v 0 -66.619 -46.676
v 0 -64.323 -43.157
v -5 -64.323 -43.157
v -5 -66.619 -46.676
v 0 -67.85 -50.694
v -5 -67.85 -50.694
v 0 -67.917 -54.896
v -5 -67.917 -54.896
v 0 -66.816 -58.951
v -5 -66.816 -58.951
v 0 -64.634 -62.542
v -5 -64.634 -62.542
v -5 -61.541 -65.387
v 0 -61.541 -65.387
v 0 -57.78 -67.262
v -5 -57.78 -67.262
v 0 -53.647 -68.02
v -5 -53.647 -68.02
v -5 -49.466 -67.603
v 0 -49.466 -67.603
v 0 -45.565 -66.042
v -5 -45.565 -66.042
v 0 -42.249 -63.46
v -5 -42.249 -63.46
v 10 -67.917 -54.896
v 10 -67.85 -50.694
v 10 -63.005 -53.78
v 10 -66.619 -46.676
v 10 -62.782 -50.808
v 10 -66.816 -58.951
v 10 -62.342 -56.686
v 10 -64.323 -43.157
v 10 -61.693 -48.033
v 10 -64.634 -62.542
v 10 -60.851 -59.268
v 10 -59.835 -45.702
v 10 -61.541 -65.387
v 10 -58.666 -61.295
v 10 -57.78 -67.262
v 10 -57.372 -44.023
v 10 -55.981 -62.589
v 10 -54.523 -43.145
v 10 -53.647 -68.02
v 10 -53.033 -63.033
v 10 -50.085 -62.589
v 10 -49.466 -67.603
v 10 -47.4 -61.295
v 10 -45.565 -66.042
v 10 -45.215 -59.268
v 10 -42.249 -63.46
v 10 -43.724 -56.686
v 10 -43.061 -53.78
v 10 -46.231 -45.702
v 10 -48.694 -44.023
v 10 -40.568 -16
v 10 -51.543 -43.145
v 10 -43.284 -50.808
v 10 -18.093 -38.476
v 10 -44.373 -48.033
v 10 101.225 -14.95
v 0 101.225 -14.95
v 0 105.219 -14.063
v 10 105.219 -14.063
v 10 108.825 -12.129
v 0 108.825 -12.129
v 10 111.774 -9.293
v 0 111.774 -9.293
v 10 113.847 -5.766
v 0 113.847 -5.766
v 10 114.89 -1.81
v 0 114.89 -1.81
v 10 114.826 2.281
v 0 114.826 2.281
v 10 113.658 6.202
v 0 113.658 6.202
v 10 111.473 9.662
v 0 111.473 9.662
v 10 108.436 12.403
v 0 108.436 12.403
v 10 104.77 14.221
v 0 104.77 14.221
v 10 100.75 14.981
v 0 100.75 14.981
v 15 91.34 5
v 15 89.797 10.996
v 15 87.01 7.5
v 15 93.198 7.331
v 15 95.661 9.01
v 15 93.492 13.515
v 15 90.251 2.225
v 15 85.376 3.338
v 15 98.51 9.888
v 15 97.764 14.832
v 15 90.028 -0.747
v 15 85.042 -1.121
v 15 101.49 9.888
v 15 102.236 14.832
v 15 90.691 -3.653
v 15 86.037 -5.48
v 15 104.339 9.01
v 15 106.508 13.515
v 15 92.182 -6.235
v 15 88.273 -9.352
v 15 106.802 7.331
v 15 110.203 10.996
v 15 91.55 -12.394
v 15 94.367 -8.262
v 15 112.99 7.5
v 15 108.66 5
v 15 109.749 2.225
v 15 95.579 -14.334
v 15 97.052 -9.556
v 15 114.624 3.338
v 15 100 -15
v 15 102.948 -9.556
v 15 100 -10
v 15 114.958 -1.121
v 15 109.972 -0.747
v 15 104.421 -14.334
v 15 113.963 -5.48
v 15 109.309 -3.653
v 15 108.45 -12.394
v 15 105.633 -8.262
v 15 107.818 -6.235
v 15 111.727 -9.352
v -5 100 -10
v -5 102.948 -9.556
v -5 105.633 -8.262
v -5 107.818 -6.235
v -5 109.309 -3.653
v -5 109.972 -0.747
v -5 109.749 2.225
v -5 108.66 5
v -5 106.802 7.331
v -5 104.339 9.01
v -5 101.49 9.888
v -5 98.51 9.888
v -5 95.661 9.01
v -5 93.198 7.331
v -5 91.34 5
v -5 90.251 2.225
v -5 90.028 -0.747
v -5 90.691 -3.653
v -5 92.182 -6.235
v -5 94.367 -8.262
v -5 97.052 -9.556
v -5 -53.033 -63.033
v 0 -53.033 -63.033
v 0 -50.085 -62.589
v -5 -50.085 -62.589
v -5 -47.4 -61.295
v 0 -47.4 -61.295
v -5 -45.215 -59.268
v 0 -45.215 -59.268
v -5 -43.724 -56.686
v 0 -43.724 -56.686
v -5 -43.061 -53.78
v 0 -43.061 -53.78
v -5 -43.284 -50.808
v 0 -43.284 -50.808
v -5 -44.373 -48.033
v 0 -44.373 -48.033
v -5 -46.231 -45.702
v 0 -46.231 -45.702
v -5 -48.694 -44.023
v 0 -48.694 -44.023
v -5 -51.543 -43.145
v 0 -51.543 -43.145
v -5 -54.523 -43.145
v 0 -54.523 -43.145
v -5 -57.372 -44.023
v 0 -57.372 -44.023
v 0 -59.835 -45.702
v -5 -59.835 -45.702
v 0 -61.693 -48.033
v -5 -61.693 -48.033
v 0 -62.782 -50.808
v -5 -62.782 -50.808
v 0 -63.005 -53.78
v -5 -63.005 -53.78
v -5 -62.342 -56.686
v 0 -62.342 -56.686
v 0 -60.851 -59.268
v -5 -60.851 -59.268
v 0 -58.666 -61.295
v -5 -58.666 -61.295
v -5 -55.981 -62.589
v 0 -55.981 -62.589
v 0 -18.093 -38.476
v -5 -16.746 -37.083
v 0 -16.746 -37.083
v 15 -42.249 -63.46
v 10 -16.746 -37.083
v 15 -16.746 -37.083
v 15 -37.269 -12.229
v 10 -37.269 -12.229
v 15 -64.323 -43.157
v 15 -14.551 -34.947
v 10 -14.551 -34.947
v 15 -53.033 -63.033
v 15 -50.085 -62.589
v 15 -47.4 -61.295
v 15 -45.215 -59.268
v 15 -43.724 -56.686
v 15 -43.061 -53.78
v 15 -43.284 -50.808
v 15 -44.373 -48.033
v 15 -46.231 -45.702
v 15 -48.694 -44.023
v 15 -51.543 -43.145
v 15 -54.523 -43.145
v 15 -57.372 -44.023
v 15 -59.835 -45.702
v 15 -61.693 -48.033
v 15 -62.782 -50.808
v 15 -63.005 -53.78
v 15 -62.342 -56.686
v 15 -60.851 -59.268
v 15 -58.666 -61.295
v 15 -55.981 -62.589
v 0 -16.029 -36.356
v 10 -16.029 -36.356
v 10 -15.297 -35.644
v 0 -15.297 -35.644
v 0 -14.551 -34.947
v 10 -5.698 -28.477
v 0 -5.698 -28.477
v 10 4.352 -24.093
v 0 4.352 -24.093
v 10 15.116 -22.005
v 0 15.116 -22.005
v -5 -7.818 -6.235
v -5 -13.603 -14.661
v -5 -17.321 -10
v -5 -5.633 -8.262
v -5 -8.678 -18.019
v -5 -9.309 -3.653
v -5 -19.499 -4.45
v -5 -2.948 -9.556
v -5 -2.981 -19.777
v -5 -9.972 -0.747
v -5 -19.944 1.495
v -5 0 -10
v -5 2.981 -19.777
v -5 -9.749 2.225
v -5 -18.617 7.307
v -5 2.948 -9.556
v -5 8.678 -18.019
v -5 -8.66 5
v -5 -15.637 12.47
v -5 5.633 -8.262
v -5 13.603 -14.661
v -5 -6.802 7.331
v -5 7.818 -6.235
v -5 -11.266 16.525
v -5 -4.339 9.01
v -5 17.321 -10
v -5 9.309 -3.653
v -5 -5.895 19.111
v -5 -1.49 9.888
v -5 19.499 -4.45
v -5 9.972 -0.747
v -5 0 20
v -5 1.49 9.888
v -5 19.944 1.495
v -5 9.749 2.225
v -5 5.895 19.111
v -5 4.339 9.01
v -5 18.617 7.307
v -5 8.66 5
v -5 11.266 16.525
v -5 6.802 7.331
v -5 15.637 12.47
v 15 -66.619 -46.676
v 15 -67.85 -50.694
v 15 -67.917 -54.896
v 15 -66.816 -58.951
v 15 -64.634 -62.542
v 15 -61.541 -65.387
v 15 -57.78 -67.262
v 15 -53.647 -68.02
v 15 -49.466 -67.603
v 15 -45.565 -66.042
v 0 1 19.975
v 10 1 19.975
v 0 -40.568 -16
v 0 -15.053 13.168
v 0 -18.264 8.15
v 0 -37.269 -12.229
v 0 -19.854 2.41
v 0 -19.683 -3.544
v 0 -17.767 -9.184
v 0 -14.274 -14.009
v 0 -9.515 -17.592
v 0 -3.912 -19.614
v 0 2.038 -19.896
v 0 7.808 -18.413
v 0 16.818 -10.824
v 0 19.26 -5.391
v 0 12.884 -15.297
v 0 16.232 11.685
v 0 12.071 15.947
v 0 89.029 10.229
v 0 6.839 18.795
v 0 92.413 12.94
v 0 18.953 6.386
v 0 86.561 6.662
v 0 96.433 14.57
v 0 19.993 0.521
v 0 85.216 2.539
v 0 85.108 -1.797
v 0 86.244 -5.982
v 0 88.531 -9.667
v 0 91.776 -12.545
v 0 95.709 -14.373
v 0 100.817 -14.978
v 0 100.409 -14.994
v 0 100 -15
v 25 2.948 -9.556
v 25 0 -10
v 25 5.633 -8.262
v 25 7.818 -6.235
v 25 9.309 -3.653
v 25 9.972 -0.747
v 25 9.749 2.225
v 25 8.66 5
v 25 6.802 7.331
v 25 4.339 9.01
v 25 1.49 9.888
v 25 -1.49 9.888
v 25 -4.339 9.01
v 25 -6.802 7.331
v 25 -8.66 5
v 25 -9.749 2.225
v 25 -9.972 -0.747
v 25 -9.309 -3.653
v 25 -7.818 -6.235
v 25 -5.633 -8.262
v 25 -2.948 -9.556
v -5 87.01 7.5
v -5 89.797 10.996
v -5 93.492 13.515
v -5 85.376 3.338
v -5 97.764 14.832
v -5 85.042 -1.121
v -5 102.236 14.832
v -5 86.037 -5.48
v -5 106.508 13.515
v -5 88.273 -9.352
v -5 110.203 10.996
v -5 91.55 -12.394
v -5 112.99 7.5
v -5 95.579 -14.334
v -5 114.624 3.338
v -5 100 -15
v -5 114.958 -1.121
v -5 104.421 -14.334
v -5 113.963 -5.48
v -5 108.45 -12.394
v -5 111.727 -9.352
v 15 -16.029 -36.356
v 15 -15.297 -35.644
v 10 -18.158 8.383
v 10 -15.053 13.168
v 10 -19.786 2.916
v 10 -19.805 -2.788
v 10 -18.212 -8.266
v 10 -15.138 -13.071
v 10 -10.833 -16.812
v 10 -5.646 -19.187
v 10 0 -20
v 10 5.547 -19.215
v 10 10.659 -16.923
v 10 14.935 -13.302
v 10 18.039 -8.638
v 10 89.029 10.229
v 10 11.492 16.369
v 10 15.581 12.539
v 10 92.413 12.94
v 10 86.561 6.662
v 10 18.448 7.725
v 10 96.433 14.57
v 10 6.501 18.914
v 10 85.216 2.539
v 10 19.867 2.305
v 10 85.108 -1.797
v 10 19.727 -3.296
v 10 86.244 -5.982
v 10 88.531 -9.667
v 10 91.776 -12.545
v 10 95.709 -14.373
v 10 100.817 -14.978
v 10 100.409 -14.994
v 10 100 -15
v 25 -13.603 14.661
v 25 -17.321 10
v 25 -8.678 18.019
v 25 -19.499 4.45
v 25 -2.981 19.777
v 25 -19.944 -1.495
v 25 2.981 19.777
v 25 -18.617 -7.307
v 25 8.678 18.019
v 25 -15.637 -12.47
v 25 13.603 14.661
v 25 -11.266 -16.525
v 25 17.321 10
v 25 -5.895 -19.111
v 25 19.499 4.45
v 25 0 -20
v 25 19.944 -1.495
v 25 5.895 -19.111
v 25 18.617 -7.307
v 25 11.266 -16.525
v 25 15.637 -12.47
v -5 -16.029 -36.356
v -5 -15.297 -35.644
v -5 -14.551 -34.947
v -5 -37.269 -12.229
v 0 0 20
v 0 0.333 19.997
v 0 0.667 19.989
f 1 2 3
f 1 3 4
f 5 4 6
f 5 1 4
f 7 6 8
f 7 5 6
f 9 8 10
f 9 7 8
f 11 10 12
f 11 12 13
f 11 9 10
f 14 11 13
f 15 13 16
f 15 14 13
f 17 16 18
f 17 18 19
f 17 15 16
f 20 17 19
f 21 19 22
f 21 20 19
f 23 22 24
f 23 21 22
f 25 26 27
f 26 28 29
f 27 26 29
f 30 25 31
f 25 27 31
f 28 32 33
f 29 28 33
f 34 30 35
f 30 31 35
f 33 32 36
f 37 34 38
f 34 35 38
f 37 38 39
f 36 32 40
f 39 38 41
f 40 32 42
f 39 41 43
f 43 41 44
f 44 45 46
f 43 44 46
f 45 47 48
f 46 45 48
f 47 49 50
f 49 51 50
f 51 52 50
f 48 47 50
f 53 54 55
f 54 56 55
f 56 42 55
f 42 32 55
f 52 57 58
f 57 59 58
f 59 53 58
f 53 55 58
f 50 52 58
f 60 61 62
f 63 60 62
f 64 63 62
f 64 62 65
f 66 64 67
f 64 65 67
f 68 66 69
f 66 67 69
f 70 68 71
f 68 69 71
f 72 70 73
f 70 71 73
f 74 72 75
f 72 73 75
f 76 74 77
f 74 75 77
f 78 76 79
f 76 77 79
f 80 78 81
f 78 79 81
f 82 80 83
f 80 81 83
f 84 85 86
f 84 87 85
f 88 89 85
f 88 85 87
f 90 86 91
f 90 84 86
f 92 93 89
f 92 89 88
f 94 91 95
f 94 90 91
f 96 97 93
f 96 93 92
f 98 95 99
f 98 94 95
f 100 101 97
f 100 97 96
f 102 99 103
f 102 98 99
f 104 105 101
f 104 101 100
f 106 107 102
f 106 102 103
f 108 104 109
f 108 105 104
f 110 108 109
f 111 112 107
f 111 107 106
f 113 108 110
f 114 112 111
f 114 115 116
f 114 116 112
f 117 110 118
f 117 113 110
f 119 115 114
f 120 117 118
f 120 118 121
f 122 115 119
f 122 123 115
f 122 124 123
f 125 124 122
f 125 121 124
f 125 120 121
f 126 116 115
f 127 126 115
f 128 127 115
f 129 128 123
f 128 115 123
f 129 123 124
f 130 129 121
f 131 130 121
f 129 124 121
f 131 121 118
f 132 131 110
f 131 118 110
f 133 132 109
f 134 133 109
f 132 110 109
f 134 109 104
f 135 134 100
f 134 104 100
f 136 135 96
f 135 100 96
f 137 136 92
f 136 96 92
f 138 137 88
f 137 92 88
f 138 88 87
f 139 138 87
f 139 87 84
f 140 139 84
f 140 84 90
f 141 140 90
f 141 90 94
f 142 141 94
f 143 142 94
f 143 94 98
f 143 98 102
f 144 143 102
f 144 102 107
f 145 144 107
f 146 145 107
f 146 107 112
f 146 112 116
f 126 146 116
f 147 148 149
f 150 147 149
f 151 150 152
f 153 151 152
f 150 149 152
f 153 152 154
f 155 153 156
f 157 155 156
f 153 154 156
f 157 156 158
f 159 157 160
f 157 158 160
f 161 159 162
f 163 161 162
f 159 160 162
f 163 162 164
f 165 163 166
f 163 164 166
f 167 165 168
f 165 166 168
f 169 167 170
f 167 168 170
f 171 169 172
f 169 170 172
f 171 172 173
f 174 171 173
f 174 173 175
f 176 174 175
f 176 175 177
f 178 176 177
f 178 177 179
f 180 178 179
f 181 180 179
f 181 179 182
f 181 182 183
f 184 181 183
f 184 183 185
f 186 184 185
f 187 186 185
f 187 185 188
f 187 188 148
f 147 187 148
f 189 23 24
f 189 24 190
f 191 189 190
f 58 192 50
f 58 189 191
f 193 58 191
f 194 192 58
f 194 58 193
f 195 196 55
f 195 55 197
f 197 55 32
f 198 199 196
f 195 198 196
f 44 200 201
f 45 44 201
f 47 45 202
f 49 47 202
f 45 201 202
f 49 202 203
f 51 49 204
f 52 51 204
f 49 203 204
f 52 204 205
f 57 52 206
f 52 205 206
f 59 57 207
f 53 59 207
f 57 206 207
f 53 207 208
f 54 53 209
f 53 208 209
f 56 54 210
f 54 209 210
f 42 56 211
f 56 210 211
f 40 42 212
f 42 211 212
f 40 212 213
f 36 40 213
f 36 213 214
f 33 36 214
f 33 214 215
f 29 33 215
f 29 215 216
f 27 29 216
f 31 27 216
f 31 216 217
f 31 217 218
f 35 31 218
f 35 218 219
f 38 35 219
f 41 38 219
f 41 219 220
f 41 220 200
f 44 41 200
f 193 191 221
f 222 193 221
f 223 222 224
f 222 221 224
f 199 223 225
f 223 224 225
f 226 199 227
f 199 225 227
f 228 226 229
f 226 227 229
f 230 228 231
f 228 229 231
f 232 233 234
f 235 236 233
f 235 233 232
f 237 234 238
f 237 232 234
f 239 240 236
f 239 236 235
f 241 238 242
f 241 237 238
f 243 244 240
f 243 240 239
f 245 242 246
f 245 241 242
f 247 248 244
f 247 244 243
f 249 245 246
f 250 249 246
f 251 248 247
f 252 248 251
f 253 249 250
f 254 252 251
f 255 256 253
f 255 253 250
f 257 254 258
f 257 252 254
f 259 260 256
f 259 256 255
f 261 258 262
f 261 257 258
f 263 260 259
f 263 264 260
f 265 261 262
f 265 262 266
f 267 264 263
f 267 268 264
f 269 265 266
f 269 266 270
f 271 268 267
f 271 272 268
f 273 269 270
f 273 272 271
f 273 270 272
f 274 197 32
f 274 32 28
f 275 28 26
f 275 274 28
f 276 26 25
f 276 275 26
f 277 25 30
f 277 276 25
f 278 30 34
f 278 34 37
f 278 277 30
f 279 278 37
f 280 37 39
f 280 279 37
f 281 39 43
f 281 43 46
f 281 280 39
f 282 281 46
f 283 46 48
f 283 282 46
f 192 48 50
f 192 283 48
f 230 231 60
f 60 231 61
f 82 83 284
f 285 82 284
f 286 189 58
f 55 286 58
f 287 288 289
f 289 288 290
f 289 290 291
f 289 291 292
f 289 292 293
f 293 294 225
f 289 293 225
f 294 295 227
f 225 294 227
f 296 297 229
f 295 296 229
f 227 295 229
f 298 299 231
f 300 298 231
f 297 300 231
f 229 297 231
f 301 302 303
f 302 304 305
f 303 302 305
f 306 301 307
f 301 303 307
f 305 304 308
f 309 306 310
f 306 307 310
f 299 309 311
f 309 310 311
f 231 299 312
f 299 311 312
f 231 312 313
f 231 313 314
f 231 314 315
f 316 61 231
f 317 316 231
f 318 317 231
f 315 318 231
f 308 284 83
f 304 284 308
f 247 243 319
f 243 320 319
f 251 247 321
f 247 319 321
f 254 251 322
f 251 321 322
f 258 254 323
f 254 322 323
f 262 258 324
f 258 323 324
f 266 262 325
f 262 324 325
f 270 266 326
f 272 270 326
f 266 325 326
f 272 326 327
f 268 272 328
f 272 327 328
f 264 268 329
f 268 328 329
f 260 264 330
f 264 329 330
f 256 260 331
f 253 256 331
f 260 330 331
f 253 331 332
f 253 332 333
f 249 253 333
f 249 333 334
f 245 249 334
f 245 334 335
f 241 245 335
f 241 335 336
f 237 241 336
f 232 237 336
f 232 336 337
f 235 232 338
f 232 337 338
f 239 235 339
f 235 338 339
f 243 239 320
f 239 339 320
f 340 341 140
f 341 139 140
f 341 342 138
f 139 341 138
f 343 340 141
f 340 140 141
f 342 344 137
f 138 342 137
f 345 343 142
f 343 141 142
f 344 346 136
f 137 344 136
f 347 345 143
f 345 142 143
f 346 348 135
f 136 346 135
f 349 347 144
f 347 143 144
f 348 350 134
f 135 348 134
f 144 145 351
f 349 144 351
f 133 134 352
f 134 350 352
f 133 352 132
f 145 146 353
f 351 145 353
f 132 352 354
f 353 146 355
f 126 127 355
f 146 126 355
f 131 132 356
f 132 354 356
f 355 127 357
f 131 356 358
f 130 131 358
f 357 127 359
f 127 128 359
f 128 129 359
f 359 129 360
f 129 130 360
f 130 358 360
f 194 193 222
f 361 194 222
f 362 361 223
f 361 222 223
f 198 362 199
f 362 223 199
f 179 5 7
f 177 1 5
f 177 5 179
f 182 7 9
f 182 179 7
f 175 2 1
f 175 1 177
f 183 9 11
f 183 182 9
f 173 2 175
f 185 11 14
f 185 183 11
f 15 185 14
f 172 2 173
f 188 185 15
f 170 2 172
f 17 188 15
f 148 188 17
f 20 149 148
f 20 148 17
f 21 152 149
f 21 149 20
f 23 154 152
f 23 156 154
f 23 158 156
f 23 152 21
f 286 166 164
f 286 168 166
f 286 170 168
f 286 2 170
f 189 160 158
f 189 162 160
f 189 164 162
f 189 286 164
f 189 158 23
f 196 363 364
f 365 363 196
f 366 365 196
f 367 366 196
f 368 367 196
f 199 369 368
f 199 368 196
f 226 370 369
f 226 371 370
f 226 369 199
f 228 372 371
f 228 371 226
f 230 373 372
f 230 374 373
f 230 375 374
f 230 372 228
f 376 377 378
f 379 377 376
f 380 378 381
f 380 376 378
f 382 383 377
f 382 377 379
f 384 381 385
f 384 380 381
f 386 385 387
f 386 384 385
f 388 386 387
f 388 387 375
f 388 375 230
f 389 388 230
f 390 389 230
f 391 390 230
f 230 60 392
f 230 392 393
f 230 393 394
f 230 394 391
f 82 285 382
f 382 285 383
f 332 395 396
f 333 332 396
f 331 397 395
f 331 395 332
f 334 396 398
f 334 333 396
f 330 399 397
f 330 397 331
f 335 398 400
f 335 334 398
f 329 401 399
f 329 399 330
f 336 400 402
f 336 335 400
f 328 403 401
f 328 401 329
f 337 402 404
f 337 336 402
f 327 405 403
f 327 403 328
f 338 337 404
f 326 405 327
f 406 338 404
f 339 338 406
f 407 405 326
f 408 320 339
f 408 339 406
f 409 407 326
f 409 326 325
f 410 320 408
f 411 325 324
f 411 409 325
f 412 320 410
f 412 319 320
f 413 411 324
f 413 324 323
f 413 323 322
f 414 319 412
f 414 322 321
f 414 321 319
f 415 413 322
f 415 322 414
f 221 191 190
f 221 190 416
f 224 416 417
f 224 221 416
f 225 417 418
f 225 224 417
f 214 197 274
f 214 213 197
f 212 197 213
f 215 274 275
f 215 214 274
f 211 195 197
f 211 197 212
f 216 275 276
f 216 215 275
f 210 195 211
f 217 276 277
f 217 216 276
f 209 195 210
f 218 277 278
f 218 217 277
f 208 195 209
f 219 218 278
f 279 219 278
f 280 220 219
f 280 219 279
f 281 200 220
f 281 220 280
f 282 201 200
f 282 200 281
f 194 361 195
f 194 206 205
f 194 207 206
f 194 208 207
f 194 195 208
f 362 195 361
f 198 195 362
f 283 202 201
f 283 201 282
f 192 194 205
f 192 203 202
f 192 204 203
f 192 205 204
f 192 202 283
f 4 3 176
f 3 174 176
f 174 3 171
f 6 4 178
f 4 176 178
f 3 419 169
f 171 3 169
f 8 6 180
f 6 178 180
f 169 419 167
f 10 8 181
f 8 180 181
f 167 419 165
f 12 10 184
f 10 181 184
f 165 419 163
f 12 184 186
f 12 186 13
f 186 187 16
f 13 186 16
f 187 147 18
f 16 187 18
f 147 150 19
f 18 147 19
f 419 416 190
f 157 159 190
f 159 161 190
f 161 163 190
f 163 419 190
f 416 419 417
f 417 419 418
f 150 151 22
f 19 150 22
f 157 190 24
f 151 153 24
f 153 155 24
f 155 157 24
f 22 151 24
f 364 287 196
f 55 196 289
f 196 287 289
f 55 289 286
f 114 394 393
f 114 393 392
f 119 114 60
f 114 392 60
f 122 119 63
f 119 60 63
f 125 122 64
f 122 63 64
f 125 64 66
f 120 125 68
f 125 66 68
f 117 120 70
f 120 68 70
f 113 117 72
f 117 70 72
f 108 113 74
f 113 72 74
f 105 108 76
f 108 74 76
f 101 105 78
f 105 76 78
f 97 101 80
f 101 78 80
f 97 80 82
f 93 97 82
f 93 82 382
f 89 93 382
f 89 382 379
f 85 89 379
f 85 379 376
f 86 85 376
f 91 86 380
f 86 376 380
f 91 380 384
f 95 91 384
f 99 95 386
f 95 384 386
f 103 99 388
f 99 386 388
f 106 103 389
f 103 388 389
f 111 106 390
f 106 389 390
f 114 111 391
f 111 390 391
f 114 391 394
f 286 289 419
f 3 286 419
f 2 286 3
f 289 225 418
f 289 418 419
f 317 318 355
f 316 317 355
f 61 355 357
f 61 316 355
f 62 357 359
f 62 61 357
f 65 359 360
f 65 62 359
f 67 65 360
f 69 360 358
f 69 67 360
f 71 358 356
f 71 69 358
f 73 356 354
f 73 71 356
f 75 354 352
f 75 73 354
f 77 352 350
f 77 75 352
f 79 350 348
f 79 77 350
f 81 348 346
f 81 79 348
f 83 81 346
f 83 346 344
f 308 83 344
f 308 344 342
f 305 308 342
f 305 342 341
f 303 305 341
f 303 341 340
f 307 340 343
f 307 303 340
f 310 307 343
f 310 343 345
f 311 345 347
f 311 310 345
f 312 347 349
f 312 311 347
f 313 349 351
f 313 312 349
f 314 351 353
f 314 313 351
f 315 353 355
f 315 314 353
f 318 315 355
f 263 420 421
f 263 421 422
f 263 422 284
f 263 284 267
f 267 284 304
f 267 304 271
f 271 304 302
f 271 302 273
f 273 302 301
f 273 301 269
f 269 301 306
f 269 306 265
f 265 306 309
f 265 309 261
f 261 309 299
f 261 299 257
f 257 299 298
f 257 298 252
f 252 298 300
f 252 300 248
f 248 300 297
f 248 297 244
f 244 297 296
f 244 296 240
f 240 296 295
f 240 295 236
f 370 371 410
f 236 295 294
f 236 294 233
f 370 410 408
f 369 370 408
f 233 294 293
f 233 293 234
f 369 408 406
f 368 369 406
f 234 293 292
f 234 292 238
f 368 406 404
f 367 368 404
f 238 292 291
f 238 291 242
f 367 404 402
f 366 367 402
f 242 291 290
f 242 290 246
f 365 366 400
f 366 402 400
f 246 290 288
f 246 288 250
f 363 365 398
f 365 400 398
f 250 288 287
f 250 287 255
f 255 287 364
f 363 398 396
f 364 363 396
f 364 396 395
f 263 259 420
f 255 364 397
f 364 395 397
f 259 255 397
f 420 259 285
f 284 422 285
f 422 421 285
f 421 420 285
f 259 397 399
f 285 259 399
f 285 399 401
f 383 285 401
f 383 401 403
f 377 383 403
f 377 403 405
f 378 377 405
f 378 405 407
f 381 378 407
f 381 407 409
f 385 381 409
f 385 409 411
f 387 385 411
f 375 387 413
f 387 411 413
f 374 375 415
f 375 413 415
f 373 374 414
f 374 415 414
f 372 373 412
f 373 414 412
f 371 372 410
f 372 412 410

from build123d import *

# Parameters (mm, degrees)
IZIM1_R                     = 20
Y_KSEKLIK_EKSTR_ZYON1_DEPTH = 10
IZIM2_R                     = 15
Y_KSEKLIK_EKSTR_ZYON2_DEPTH = 5
IZIM3_R                     = 20
Y_KSEKLIK_EKSTR_ZYON3_DEPTH = 15
IZIM4_R                     = 20
Y_KSEKLIK_EKSTR_ZYON4_DEPTH = 5
IZIM5_R                     = 10
KES_EKSTR_ZYON1_DEPTH       = 11
KES_EKSTR_ZYON1_DEPTH_BACK  = 21
Y_KSEKLIK_EKSTR_ZYON5_DEPTH = 5
KES_EKSTR_ZYON3_START       = -5
IZIM8_W                     = 10
IZIM8_H                     = 55.466945175
KES_EKSTR_ZYON3_DEPTH       = 90
IZIM9_R                     = 10
KES_EKSTR_ZYON4_DEPTH       = 21


with BuildPart() as part:
    # Çizim1 → Yükseklik-Ekstrüzyon1 (new body)
    with BuildSketch(Plane(origin=(0, 0, 0), x_dir=(0, 0, -1), z_dir=(1, 0, 0))):
        with BuildLine():
            Line((22.00493217, 15.116319136), (14.949905951, 101.224872265))
            ThreePointArc((14.949905951, 101.224872265), (-0.237952402, 114.998112503), (-14.981238267, 100.75))
            Line((-14.981238267, 100.75), (-19.974984355, 1))
            ThreePointArc((-19.974984355, 1), (0.500156421, 19.993745111), (20, 0))
            ThreePointArc((20, 0), (8.265673223, -18.212046732), (-13.167864617, -15.053482701))
            Line((-13.167864617, -15.053482701), (43.157110126, -64.323120614))
            ThreePointArc((43.157110126, -64.323120614), (64.073343656, -63.187367339), (63.459512577, -42.249316522))
            Line((63.459512577, -42.249316522), (37.082938713, -16.746413538))
            ThreePointArc((37.082938713, -16.746413538), (26.642905037, -2.187865906), (22.00493217, 15.116319136))
        make_face()
        Circle(IZIM1_R)
    extrude(amount=Y_KSEKLIK_EKSTR_ZYON1_DEPTH)

    # Çizim2 → Yükseklik-Ekstrüzyon2 (add)
    with BuildSketch(Plane(origin=(10, 0, 0), x_dir=(0, 0, -1), z_dir=(1, 0, 0))):
        with Locations((0, 100)):
            Circle(IZIM2_R)
    y_kseklik_ekstr_zyon2 = extrude(amount=Y_KSEKLIK_EKSTR_ZYON2_DEPTH)

    # Aynalama1: Yükseklik-Ekstrüzyon2 across plane
    add(y_kseklik_ekstr_zyon2.mirror(Plane(origin=(5, 0, 0), x_dir=(0, 0, 1), z_dir=(1, 0, 0))))

    # Çizim3 → Yükseklik-Ekstrüzyon3 (add)
    with BuildSketch(Plane(origin=(10, 0, 0), x_dir=(0, 0, -1), z_dir=(1, 0, 0))):
        Circle(IZIM3_R)
    extrude(amount=Y_KSEKLIK_EKSTR_ZYON3_DEPTH)

    # Çizim4 → Yükseklik-Ekstrüzyon4 (add)
    with BuildSketch(Plane.ZY):
        Circle(IZIM4_R)
    extrude(amount=Y_KSEKLIK_EKSTR_ZYON4_DEPTH)

    # Çizim5 → Kes-Ekstrüzyon1 (cut, two sides)
    with BuildSketch(Plane(origin=(15, 0, 0), x_dir=(0, 0, -1), z_dir=(1, 0, 0))) as kes_ekstr_zyon1_sk:
        with Locations((0, 100)):
            Circle(IZIM5_R)
        Circle(IZIM5_R)
    extrude(amount=KES_EKSTR_ZYON1_DEPTH, mode=Mode.SUBTRACT)
    extrude(kes_ekstr_zyon1_sk.sketch, amount=-KES_EKSTR_ZYON1_DEPTH_BACK, mode=Mode.SUBTRACT)

    # Çizim6 → Yükseklik-Ekstrüzyon5 (add)
    with BuildSketch(Plane(origin=(10, 0, 0), x_dir=(0, 0, -1), z_dir=(1, 0, 0))):
        with BuildLine():
            ThreePointArc((37.082938713, -16.746413538), (35.998094477, -15.664861033), (34.94689158, -14.550583103))
            Line((34.94689158, -14.550583103), (12.228664173, -37.26881051))
            Line((12.228664173, -37.26881051), (43.157110126, -64.323120614))
            ThreePointArc((43.157110126, -64.323120614), (64.073343656, -63.187367339), (63.459512577, -42.249316522))
            Line((63.459512577, -42.249316522), (37.082938713, -16.746413538))
        make_face()
    y_kseklik_ekstr_zyon5 = extrude(amount=Y_KSEKLIK_EKSTR_ZYON5_DEPTH)

    # Aynalama2: Yükseklik-Ekstrüzyon5 across plane
    add(y_kseklik_ekstr_zyon5.mirror(Plane(origin=(5, 0, 0), x_dir=(0, 0, 1), z_dir=(1, 0, 0))))

    # Çizim8 → Kes-Ekstrüzyon3 (cut)
    with BuildSketch(Plane(origin=(0, -24.748737342, -24.748737342), x_dir=(1, 0, 0), z_dir=(0, 0.707106781, 0.707106781)).offset(KES_EKSTR_ZYON3_START)):
        with Locations((5, -5.759989705)):
            Rectangle(IZIM8_W, IZIM8_H)
    extrude(amount=-KES_EKSTR_ZYON3_DEPTH, mode=Mode.SUBTRACT)

    # Çizim9 → Kes-Ekstrüzyon4 (cut, through all)
    with BuildSketch(Plane(origin=(15, 0, 0), x_dir=(0, 0, -1), z_dir=(1, 0, 0))):
        with Locations((53.033008589, -53.033008589)):
            Circle(IZIM9_R)
    extrude(amount=-KES_EKSTR_ZYON4_DEPTH, mode=Mode.SUBTRACT)


solid = part.part
